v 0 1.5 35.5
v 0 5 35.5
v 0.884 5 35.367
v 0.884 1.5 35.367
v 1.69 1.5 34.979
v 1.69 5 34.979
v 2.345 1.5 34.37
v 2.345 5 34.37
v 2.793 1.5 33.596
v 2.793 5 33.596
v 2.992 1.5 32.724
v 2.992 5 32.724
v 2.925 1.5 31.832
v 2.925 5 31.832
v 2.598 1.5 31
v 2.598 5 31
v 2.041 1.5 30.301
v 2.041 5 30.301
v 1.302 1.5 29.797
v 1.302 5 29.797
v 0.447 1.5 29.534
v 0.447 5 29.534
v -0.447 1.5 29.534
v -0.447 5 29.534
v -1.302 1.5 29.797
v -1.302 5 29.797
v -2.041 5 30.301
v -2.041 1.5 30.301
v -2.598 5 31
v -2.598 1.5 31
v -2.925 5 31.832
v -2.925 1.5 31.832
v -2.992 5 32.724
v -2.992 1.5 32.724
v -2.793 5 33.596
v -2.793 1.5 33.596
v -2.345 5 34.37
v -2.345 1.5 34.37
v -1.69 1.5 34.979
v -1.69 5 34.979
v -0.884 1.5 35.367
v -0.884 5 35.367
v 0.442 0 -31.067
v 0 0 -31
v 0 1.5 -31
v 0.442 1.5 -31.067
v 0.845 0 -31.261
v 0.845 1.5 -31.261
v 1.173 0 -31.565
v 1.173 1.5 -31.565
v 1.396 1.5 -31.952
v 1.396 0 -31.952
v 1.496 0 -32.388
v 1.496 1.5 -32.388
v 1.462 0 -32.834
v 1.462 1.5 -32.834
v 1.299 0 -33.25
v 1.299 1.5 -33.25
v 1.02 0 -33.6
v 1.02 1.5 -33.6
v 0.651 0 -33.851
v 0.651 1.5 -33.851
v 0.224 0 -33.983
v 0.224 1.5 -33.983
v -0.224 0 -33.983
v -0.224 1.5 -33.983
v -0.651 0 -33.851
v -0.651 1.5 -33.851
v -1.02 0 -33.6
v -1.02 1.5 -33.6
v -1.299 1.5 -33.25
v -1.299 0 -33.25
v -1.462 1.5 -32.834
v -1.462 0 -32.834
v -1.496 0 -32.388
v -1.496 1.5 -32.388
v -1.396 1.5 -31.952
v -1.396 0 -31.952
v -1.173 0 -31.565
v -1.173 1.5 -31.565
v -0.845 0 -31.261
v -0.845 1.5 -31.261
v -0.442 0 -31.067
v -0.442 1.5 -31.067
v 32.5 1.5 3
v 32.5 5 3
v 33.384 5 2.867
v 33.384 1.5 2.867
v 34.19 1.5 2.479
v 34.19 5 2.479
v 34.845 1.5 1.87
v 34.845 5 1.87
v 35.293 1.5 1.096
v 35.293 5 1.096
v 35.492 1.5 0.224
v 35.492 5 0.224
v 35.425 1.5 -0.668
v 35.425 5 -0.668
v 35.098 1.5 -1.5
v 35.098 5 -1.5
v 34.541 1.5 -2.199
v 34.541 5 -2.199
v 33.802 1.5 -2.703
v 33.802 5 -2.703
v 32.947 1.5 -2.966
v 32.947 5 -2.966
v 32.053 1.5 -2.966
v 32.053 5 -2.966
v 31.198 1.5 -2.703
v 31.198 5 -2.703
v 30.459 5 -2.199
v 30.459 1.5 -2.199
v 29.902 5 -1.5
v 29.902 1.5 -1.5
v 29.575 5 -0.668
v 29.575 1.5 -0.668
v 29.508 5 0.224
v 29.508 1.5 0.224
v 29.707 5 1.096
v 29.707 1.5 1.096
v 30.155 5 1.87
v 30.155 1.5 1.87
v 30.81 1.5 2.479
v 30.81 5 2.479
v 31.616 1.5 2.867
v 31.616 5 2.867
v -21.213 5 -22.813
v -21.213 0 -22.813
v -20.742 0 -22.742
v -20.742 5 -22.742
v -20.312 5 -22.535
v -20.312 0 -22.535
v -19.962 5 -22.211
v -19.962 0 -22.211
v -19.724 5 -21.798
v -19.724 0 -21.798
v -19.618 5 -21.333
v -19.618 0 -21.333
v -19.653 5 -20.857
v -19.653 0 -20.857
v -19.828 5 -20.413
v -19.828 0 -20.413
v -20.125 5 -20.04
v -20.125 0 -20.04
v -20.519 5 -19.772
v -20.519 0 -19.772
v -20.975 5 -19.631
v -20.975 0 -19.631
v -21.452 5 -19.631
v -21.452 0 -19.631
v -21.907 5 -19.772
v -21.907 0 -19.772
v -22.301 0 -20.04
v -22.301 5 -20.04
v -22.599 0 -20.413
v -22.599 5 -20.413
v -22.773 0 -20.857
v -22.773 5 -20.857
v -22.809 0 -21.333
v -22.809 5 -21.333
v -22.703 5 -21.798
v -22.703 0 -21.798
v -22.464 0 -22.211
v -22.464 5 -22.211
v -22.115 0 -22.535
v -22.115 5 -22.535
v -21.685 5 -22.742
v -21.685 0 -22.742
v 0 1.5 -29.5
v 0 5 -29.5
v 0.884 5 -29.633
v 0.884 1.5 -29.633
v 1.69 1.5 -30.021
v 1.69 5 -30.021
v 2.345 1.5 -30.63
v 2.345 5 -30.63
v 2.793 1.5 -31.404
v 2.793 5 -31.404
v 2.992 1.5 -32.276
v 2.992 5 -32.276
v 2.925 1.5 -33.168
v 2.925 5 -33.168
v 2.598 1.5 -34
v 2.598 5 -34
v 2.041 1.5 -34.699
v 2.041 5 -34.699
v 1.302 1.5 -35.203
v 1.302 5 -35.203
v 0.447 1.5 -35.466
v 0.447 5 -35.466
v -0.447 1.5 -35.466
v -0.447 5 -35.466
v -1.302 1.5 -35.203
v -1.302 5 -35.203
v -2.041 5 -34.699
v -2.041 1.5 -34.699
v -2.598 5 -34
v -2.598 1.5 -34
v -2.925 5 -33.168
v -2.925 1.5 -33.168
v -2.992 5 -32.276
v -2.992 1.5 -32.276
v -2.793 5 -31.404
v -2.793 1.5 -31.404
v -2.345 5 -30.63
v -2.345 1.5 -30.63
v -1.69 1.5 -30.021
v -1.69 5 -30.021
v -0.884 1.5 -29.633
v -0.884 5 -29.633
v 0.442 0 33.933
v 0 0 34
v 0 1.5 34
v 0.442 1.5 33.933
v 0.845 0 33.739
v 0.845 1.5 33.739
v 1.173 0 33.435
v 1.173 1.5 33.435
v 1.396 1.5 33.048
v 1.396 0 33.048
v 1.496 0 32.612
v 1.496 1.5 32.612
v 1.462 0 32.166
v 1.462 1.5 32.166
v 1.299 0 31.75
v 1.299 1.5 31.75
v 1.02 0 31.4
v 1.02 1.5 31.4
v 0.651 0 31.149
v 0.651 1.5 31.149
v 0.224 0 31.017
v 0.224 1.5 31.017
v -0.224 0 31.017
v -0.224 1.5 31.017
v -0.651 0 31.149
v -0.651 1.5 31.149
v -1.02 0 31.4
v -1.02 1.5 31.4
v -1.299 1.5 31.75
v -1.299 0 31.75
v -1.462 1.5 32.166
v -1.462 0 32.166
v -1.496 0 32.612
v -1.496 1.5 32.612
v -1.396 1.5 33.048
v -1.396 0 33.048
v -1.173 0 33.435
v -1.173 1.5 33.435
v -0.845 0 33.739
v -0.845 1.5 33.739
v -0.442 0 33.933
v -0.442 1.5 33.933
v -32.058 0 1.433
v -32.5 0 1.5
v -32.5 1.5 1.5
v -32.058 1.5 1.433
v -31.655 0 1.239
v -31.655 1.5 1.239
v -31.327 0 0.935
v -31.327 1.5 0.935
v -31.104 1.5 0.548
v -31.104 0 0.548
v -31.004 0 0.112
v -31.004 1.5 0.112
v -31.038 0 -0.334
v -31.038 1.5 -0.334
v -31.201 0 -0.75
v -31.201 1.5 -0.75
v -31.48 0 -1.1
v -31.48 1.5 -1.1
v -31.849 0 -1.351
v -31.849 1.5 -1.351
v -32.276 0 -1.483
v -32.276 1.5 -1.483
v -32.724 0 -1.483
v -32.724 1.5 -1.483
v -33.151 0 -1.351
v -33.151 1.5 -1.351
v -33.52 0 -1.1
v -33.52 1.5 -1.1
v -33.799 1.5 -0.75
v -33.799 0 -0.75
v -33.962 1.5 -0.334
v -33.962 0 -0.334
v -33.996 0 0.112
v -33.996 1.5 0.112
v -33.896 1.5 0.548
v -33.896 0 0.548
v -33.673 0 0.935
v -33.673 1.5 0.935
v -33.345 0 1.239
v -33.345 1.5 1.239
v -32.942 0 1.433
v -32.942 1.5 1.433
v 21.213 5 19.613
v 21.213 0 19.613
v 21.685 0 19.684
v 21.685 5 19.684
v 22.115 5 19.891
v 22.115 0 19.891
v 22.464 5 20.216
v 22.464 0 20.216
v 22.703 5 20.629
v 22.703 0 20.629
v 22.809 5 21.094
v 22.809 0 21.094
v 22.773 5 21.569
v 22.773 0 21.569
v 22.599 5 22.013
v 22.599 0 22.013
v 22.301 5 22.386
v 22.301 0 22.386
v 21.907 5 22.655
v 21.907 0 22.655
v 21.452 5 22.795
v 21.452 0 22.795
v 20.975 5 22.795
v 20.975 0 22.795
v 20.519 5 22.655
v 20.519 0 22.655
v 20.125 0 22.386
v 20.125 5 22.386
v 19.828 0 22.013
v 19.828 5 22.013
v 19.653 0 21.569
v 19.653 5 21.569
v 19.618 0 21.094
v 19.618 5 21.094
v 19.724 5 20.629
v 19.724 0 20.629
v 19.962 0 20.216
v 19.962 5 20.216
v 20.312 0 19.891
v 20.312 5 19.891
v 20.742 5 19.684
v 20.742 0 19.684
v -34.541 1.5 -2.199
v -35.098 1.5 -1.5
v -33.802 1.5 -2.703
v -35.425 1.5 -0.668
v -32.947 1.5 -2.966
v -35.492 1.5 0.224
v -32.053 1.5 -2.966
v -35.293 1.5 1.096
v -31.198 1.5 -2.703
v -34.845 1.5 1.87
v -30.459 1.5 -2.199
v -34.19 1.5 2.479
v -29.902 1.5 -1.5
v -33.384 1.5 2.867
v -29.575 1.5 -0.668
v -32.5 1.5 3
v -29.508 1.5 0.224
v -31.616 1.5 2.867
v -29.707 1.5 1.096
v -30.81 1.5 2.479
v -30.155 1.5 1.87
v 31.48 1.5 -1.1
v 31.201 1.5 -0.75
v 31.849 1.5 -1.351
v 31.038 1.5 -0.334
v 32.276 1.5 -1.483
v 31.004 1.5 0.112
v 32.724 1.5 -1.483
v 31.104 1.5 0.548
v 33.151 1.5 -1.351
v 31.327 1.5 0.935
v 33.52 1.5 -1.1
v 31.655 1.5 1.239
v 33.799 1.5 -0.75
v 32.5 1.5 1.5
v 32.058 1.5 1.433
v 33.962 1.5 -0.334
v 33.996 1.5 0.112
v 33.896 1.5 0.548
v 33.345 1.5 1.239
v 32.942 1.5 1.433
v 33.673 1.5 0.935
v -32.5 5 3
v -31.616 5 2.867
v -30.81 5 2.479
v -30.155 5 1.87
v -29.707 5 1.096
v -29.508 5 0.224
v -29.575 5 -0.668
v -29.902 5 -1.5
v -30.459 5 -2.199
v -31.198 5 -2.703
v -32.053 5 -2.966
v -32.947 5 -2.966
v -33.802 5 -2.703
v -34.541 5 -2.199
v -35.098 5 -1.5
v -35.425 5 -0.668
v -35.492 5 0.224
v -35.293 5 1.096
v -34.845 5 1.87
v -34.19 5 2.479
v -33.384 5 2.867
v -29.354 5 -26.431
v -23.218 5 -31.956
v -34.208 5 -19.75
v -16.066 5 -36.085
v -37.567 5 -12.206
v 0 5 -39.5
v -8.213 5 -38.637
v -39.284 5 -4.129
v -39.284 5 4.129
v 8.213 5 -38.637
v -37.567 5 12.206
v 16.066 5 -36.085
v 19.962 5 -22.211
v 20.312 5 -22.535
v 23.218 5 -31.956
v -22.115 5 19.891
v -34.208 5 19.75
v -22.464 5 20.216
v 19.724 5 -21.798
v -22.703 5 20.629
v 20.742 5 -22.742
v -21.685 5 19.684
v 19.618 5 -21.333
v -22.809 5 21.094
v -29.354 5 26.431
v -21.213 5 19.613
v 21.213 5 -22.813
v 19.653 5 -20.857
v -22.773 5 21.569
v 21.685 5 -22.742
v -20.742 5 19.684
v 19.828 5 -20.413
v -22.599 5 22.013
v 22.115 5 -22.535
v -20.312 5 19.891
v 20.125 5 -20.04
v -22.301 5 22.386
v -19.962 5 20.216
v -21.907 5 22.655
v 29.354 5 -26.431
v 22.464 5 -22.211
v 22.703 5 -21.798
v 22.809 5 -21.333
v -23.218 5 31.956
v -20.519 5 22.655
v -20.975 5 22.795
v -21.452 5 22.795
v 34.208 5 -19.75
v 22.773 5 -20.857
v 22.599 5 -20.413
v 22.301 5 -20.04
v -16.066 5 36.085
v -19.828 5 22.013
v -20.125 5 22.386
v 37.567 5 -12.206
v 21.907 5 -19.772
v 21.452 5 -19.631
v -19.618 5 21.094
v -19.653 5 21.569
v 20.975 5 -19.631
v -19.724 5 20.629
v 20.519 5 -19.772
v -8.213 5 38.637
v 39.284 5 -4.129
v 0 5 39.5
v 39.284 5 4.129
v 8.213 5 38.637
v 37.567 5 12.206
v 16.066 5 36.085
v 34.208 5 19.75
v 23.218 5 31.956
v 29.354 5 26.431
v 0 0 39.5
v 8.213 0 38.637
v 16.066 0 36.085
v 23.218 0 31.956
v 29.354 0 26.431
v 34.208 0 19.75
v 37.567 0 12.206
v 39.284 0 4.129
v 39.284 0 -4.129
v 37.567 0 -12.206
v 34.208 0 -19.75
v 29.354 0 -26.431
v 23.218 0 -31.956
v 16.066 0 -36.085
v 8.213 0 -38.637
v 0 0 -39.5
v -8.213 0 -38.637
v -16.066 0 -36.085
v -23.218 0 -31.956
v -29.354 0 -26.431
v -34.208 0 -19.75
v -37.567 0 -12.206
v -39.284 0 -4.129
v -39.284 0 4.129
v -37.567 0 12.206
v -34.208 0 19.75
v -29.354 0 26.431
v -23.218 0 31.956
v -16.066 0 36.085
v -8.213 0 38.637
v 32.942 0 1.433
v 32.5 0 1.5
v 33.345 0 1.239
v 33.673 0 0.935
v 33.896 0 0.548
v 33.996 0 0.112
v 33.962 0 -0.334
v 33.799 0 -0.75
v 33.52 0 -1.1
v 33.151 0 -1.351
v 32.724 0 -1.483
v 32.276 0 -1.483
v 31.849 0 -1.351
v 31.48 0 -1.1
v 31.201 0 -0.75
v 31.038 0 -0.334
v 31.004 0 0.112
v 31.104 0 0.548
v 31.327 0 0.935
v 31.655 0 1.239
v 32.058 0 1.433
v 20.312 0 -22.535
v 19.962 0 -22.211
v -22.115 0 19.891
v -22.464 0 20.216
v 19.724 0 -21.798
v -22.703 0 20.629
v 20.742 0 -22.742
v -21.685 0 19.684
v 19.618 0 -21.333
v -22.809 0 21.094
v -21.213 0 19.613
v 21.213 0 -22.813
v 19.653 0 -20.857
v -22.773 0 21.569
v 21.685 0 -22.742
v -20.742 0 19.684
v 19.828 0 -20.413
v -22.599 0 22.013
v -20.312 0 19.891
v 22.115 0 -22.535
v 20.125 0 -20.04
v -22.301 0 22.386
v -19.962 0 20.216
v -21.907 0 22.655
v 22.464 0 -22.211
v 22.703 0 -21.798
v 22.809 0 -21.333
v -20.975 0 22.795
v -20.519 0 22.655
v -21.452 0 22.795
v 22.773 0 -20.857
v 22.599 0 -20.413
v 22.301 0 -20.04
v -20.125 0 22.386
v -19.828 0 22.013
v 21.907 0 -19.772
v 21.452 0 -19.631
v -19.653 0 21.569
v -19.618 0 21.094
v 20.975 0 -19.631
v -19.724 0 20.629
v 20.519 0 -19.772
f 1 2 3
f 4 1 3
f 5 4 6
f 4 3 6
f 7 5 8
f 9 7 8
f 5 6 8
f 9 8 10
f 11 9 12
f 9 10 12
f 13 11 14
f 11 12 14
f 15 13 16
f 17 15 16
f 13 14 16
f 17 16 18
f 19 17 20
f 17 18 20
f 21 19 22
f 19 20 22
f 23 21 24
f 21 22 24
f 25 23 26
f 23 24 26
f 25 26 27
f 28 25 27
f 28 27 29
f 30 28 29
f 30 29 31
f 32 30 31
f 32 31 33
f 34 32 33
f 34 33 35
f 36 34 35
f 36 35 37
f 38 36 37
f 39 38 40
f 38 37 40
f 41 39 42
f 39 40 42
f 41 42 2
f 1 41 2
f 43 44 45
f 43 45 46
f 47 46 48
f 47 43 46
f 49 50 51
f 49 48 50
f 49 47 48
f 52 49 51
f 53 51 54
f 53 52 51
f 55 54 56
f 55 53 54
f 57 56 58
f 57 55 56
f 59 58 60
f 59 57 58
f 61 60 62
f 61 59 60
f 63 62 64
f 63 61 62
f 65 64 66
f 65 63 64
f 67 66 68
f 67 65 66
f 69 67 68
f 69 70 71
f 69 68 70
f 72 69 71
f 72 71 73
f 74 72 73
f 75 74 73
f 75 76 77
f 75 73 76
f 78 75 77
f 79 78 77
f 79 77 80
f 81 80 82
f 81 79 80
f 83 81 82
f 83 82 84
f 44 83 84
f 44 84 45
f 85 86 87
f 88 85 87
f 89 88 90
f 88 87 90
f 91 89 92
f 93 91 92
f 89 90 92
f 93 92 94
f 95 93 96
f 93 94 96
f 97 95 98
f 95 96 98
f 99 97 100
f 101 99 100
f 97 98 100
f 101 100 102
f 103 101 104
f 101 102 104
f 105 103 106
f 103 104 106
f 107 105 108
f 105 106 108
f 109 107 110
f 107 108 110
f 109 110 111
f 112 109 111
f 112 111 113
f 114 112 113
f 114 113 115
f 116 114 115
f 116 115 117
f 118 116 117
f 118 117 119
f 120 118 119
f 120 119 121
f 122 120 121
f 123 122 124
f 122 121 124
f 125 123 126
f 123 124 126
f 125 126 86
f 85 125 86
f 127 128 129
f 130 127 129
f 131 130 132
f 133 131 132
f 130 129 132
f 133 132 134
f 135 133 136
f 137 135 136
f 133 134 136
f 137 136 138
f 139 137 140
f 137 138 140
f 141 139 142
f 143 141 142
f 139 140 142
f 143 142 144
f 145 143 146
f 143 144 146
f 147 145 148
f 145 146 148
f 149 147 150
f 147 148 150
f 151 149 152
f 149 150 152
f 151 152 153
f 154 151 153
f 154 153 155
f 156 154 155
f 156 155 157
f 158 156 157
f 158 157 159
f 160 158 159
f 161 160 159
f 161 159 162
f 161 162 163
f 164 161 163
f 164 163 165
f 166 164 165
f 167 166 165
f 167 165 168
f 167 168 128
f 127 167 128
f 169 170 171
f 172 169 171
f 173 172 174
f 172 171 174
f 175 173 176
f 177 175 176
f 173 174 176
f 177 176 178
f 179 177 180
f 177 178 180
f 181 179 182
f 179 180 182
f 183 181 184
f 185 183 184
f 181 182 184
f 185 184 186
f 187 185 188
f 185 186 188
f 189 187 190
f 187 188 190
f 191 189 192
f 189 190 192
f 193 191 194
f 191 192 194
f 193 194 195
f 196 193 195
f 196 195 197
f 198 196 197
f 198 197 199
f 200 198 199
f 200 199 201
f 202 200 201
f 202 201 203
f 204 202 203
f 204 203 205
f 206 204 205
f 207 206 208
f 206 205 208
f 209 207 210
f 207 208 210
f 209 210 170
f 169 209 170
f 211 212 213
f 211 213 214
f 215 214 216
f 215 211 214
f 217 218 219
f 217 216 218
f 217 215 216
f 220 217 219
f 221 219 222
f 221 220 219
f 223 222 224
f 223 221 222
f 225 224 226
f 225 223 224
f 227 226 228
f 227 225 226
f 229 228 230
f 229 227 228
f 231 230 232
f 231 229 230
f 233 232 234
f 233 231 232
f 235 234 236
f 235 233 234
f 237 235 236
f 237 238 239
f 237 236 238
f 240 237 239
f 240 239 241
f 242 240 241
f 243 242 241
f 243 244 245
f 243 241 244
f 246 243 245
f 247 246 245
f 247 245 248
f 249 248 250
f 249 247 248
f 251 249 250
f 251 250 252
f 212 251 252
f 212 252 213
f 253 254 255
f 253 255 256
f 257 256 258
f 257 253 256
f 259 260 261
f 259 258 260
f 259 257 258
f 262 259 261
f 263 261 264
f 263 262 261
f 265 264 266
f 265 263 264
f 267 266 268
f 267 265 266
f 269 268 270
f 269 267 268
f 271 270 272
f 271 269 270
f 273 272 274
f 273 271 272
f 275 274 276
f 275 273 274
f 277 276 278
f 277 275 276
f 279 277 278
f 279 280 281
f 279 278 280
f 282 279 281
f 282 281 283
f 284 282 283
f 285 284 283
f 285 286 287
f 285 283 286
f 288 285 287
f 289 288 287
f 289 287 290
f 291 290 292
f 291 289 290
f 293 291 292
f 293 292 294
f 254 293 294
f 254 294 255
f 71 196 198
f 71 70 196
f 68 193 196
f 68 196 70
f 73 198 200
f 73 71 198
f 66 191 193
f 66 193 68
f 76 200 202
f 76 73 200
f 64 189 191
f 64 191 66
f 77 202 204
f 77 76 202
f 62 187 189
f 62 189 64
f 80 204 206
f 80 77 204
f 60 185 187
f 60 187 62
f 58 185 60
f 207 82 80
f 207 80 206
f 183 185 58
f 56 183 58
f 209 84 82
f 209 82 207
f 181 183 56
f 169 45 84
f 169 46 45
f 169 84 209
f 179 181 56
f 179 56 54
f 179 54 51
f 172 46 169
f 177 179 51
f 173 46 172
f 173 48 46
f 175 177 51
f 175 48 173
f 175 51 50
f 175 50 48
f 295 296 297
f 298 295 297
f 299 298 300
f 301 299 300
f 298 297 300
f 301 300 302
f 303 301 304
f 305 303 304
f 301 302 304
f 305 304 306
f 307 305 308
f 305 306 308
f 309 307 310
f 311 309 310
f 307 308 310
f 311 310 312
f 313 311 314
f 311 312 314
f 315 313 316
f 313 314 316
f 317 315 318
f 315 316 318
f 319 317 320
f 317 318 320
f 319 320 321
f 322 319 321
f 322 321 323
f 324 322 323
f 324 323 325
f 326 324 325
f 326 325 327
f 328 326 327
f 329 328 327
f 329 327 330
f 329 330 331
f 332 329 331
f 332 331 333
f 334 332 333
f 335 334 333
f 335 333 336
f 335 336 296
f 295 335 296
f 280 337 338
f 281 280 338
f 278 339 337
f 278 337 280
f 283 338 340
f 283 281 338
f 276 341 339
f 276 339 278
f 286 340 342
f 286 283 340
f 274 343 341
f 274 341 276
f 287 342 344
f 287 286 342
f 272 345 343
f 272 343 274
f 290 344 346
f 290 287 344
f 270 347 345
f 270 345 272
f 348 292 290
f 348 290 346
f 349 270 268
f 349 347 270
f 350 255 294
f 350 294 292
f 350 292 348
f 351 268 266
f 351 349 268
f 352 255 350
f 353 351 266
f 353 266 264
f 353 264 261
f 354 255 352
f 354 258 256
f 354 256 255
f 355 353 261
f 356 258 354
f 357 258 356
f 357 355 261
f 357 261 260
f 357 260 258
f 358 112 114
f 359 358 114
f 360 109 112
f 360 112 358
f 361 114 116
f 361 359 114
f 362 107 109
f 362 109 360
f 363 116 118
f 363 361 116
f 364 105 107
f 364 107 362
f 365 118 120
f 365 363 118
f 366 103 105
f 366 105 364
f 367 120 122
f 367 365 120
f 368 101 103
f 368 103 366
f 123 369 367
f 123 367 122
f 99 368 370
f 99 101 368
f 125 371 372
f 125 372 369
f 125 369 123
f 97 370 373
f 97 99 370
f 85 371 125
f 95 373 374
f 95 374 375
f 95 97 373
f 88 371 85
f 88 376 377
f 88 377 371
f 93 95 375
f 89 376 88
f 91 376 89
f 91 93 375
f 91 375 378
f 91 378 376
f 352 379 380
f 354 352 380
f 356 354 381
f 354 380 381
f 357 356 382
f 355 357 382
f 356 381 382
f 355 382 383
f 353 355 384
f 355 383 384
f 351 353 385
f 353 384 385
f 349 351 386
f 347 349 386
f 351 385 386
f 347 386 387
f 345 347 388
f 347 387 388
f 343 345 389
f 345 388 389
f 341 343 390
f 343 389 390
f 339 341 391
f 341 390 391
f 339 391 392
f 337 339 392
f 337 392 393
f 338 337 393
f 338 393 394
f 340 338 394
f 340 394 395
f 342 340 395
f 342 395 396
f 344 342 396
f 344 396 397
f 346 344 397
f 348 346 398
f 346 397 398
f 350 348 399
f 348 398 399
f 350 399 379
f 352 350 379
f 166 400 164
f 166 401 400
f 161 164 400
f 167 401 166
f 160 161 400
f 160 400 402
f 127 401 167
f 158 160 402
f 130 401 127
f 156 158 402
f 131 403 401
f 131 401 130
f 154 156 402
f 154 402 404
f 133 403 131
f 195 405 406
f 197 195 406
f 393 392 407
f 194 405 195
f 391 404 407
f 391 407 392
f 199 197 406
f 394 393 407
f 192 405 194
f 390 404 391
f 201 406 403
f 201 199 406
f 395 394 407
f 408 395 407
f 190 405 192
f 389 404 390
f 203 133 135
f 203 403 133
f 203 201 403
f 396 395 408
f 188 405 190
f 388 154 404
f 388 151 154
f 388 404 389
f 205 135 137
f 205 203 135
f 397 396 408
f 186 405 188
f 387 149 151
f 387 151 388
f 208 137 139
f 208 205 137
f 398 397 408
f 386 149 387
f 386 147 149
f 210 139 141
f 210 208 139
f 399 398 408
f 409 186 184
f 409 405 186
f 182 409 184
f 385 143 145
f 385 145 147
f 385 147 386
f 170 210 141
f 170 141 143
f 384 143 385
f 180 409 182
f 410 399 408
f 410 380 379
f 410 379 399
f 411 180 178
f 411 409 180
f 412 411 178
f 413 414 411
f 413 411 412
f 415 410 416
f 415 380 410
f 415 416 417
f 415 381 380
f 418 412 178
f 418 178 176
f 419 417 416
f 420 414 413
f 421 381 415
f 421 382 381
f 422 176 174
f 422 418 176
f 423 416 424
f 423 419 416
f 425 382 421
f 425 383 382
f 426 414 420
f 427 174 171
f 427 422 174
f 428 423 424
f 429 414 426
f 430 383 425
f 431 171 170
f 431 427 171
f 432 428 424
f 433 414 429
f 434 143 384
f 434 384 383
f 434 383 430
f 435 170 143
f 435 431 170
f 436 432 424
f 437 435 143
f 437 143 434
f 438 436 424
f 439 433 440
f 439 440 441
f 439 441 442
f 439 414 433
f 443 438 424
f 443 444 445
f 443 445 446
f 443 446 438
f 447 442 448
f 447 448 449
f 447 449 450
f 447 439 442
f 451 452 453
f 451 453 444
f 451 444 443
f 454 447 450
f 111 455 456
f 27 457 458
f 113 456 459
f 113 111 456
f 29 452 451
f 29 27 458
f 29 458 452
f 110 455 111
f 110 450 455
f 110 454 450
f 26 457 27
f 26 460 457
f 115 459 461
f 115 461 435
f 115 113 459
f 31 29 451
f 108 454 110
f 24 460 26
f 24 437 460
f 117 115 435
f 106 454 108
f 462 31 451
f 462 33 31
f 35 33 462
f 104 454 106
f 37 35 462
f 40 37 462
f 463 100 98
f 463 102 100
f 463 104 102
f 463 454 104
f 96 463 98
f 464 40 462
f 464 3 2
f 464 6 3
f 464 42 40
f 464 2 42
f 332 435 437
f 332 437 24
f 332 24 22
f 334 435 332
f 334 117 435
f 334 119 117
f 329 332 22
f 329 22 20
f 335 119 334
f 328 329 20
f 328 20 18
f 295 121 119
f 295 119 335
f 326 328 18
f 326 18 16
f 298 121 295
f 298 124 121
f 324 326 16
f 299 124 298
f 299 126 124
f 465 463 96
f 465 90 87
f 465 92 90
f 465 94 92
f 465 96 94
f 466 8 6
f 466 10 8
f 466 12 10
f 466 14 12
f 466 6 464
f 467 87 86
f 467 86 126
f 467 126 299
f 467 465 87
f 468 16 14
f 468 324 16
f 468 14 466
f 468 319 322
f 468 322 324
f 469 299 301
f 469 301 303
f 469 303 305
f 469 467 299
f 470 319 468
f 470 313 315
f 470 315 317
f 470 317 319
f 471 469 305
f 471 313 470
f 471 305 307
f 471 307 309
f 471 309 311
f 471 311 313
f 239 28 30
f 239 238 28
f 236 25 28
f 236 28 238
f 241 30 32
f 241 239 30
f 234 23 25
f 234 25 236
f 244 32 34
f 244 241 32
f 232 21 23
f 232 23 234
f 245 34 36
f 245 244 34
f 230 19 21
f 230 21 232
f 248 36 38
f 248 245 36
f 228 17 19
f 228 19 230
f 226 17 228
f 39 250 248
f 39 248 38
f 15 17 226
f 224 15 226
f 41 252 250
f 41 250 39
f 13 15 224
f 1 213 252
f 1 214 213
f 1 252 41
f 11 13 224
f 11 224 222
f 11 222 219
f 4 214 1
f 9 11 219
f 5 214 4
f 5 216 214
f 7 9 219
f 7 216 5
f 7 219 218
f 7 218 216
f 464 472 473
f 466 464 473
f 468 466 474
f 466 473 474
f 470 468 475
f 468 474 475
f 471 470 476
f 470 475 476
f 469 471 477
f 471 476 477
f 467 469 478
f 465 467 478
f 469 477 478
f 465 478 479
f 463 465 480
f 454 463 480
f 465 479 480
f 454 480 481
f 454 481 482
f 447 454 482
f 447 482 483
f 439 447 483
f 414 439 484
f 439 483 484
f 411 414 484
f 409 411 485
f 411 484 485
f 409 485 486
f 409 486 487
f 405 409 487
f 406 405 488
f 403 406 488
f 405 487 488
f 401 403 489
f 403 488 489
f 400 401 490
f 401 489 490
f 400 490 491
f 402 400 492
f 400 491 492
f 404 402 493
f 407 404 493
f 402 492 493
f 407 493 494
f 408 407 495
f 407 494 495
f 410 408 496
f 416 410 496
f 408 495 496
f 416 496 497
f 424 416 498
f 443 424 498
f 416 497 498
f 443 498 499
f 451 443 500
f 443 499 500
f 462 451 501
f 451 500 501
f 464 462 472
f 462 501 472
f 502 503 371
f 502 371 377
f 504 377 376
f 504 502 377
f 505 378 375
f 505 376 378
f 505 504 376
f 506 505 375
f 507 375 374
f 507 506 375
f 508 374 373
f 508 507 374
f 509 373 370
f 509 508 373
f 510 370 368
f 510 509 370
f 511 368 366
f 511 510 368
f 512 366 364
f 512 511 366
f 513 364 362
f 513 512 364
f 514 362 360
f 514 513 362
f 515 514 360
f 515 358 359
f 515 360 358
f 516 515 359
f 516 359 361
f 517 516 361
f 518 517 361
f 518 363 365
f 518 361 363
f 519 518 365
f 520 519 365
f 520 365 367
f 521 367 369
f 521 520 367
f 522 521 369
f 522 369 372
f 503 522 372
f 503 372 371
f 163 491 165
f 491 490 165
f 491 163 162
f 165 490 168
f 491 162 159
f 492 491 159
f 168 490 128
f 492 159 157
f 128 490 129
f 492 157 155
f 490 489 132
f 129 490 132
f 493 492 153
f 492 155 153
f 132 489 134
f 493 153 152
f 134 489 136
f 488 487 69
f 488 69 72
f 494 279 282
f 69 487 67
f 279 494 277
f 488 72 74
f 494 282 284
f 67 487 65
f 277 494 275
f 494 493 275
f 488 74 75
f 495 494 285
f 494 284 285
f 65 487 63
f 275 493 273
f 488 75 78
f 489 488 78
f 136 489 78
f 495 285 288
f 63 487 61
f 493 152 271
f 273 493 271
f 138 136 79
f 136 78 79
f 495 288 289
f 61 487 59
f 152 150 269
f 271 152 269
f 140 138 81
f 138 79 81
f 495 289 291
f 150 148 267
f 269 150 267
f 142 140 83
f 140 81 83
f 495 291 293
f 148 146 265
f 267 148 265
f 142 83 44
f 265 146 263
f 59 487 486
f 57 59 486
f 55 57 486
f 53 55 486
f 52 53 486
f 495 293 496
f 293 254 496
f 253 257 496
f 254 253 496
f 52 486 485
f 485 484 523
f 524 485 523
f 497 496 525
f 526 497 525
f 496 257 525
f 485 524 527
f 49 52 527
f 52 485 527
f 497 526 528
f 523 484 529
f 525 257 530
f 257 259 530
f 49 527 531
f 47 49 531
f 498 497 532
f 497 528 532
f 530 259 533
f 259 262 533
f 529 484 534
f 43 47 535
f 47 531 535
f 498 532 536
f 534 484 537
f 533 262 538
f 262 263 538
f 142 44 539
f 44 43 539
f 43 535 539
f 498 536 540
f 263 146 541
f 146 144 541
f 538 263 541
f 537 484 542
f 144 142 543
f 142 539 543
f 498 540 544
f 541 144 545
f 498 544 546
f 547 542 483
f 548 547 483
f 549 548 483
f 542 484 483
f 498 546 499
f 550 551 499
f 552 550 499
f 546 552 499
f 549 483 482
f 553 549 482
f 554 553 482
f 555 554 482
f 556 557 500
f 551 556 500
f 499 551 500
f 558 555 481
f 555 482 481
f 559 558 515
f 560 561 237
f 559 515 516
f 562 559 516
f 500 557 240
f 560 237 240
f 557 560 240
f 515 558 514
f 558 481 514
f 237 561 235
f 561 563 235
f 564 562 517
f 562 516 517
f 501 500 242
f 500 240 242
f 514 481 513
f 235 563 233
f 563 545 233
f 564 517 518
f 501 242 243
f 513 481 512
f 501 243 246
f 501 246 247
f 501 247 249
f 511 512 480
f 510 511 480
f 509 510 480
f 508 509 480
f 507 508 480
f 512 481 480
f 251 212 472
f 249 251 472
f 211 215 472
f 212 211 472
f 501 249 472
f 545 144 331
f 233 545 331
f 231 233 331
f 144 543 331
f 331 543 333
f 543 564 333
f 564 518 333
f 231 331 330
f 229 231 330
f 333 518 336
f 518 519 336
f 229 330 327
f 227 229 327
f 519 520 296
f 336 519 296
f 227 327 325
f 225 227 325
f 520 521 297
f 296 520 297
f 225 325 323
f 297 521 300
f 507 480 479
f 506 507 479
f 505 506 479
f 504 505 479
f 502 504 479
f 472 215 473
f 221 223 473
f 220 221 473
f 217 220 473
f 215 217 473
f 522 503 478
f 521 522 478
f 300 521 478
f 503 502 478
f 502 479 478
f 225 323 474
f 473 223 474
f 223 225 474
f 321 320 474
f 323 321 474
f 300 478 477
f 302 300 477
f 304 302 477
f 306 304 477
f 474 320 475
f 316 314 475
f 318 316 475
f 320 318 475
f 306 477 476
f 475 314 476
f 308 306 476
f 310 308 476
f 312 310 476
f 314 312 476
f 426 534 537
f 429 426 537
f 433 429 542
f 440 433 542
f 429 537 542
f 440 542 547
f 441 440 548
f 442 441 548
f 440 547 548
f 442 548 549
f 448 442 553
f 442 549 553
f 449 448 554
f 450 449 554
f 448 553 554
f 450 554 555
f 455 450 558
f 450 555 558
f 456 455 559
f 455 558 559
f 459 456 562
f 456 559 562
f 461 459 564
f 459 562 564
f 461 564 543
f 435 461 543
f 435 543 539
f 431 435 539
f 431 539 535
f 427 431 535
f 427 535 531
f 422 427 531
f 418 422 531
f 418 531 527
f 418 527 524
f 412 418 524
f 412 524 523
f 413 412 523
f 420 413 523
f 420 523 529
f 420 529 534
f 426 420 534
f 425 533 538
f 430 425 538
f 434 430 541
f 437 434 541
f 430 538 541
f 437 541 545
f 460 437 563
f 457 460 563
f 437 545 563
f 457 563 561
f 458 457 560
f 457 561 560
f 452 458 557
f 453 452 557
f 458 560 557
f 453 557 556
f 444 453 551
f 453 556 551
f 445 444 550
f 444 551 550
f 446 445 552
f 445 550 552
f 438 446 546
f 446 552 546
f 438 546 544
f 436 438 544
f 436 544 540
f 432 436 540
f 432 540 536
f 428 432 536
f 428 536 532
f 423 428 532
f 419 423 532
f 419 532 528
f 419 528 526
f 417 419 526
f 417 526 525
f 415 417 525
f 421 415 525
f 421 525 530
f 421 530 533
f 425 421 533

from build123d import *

# Parameters (mm, degrees)
SKETCH_1_R               = 39.5
EXTRUDE_1_DEPTH          = 5
CUT_EXTRUDE_1_DEPTH      = 57.084757288
CUT_EXTRUDE_1_DEPTH_BACK = 57.084757288
SKETCH_2_R               = 1.5
SKETCH_3_R               = 3
CUT_EXTRUDE_2_DEPTH      = 3.5
SKETCH_5_R               = 1.6
CUT_EXTRUDE_3_DEPTH      = 57.084757288


with BuildPart() as part:
    # 草图1 → 凸台-拉伸1 (new body)
    with BuildSketch(Plane(origin=(0, 0, 0), x_dir=(1, 0, 0), z_dir=(0, 1, 0))):
        with Locations(Location((0, 0, 0), (0, 0, 270))):
            Circle(SKETCH_1_R)
    extrude(amount=EXTRUDE_1_DEPTH)

    # 草图2 → 切除-拉伸1 (cut, two sides: drawn at the far end of the back side and taken through both)
    with BuildSketch(Plane(origin=(0, 5, 0), x_dir=(1, 0, 0), z_dir=(0, 1, 0)).offset(-CUT_EXTRUDE_1_DEPTH_BACK)):
        with Locations(Location((0, 32.5, 0), (0, 0, 270))):
            Circle(SKETCH_2_R)
        with Locations(Location((32.5, 0, 0), (0, 0, 270))):
            Circle(SKETCH_2_R)
        with Locations(Location((0, -32.5, 0), (0, 0, 270))):
            Circle(SKETCH_2_R)
        with Locations(Location((-32.5, 0, 0), (0, 0, 270))):
            Circle(SKETCH_2_R)
    extrude(amount=CUT_EXTRUDE_1_DEPTH + CUT_EXTRUDE_1_DEPTH_BACK, mode=Mode.SUBTRACT)

    # 草图3 → 切除-拉伸2 (cut)
    with BuildSketch(Plane(origin=(0, 5, 0), x_dir=(1, 0, 0), z_dir=(0, 1, 0))):
        with Locations(Location((-32.5, 0, 0), (0, 0, 270))):
            Circle(SKETCH_3_R)
        with Locations(Location((0, -32.5, 0), (0, 0, 270))):
            Circle(SKETCH_3_R)
        with Locations(Location((32.5, 0, 0), (0, 0, 270))):
            Circle(SKETCH_3_R)
        with Locations(Location((0, 32.5, 0), (0, 0, 270))):
            Circle(SKETCH_3_R)
    extrude(amount=-CUT_EXTRUDE_2_DEPTH, mode=Mode.SUBTRACT)

    # 草图5 → 切除-拉伸3 (cut, through all)
    with BuildSketch(Plane.XZ):
        with Locations(Location((21.213203436, 21.213203436, 0), (0, 0, 270))):
            Circle(SKETCH_5_R)
        with Locations(Location((21.213203436, -21.213203436, 0), (0, 0, 270))):
            Circle(SKETCH_5_R)
        with Locations(Location((-21.213203436, -21.213203436, 0), (0, 0, 270))):
            Circle(SKETCH_5_R)
        with Locations(Location((-21.213203436, 21.213203436, 0), (0, 0, 270))):
            Circle(SKETCH_5_R)
    extrude(amount=-CUT_EXTRUDE_3_DEPTH, mode=Mode.SUBTRACT)


solid = part.part
